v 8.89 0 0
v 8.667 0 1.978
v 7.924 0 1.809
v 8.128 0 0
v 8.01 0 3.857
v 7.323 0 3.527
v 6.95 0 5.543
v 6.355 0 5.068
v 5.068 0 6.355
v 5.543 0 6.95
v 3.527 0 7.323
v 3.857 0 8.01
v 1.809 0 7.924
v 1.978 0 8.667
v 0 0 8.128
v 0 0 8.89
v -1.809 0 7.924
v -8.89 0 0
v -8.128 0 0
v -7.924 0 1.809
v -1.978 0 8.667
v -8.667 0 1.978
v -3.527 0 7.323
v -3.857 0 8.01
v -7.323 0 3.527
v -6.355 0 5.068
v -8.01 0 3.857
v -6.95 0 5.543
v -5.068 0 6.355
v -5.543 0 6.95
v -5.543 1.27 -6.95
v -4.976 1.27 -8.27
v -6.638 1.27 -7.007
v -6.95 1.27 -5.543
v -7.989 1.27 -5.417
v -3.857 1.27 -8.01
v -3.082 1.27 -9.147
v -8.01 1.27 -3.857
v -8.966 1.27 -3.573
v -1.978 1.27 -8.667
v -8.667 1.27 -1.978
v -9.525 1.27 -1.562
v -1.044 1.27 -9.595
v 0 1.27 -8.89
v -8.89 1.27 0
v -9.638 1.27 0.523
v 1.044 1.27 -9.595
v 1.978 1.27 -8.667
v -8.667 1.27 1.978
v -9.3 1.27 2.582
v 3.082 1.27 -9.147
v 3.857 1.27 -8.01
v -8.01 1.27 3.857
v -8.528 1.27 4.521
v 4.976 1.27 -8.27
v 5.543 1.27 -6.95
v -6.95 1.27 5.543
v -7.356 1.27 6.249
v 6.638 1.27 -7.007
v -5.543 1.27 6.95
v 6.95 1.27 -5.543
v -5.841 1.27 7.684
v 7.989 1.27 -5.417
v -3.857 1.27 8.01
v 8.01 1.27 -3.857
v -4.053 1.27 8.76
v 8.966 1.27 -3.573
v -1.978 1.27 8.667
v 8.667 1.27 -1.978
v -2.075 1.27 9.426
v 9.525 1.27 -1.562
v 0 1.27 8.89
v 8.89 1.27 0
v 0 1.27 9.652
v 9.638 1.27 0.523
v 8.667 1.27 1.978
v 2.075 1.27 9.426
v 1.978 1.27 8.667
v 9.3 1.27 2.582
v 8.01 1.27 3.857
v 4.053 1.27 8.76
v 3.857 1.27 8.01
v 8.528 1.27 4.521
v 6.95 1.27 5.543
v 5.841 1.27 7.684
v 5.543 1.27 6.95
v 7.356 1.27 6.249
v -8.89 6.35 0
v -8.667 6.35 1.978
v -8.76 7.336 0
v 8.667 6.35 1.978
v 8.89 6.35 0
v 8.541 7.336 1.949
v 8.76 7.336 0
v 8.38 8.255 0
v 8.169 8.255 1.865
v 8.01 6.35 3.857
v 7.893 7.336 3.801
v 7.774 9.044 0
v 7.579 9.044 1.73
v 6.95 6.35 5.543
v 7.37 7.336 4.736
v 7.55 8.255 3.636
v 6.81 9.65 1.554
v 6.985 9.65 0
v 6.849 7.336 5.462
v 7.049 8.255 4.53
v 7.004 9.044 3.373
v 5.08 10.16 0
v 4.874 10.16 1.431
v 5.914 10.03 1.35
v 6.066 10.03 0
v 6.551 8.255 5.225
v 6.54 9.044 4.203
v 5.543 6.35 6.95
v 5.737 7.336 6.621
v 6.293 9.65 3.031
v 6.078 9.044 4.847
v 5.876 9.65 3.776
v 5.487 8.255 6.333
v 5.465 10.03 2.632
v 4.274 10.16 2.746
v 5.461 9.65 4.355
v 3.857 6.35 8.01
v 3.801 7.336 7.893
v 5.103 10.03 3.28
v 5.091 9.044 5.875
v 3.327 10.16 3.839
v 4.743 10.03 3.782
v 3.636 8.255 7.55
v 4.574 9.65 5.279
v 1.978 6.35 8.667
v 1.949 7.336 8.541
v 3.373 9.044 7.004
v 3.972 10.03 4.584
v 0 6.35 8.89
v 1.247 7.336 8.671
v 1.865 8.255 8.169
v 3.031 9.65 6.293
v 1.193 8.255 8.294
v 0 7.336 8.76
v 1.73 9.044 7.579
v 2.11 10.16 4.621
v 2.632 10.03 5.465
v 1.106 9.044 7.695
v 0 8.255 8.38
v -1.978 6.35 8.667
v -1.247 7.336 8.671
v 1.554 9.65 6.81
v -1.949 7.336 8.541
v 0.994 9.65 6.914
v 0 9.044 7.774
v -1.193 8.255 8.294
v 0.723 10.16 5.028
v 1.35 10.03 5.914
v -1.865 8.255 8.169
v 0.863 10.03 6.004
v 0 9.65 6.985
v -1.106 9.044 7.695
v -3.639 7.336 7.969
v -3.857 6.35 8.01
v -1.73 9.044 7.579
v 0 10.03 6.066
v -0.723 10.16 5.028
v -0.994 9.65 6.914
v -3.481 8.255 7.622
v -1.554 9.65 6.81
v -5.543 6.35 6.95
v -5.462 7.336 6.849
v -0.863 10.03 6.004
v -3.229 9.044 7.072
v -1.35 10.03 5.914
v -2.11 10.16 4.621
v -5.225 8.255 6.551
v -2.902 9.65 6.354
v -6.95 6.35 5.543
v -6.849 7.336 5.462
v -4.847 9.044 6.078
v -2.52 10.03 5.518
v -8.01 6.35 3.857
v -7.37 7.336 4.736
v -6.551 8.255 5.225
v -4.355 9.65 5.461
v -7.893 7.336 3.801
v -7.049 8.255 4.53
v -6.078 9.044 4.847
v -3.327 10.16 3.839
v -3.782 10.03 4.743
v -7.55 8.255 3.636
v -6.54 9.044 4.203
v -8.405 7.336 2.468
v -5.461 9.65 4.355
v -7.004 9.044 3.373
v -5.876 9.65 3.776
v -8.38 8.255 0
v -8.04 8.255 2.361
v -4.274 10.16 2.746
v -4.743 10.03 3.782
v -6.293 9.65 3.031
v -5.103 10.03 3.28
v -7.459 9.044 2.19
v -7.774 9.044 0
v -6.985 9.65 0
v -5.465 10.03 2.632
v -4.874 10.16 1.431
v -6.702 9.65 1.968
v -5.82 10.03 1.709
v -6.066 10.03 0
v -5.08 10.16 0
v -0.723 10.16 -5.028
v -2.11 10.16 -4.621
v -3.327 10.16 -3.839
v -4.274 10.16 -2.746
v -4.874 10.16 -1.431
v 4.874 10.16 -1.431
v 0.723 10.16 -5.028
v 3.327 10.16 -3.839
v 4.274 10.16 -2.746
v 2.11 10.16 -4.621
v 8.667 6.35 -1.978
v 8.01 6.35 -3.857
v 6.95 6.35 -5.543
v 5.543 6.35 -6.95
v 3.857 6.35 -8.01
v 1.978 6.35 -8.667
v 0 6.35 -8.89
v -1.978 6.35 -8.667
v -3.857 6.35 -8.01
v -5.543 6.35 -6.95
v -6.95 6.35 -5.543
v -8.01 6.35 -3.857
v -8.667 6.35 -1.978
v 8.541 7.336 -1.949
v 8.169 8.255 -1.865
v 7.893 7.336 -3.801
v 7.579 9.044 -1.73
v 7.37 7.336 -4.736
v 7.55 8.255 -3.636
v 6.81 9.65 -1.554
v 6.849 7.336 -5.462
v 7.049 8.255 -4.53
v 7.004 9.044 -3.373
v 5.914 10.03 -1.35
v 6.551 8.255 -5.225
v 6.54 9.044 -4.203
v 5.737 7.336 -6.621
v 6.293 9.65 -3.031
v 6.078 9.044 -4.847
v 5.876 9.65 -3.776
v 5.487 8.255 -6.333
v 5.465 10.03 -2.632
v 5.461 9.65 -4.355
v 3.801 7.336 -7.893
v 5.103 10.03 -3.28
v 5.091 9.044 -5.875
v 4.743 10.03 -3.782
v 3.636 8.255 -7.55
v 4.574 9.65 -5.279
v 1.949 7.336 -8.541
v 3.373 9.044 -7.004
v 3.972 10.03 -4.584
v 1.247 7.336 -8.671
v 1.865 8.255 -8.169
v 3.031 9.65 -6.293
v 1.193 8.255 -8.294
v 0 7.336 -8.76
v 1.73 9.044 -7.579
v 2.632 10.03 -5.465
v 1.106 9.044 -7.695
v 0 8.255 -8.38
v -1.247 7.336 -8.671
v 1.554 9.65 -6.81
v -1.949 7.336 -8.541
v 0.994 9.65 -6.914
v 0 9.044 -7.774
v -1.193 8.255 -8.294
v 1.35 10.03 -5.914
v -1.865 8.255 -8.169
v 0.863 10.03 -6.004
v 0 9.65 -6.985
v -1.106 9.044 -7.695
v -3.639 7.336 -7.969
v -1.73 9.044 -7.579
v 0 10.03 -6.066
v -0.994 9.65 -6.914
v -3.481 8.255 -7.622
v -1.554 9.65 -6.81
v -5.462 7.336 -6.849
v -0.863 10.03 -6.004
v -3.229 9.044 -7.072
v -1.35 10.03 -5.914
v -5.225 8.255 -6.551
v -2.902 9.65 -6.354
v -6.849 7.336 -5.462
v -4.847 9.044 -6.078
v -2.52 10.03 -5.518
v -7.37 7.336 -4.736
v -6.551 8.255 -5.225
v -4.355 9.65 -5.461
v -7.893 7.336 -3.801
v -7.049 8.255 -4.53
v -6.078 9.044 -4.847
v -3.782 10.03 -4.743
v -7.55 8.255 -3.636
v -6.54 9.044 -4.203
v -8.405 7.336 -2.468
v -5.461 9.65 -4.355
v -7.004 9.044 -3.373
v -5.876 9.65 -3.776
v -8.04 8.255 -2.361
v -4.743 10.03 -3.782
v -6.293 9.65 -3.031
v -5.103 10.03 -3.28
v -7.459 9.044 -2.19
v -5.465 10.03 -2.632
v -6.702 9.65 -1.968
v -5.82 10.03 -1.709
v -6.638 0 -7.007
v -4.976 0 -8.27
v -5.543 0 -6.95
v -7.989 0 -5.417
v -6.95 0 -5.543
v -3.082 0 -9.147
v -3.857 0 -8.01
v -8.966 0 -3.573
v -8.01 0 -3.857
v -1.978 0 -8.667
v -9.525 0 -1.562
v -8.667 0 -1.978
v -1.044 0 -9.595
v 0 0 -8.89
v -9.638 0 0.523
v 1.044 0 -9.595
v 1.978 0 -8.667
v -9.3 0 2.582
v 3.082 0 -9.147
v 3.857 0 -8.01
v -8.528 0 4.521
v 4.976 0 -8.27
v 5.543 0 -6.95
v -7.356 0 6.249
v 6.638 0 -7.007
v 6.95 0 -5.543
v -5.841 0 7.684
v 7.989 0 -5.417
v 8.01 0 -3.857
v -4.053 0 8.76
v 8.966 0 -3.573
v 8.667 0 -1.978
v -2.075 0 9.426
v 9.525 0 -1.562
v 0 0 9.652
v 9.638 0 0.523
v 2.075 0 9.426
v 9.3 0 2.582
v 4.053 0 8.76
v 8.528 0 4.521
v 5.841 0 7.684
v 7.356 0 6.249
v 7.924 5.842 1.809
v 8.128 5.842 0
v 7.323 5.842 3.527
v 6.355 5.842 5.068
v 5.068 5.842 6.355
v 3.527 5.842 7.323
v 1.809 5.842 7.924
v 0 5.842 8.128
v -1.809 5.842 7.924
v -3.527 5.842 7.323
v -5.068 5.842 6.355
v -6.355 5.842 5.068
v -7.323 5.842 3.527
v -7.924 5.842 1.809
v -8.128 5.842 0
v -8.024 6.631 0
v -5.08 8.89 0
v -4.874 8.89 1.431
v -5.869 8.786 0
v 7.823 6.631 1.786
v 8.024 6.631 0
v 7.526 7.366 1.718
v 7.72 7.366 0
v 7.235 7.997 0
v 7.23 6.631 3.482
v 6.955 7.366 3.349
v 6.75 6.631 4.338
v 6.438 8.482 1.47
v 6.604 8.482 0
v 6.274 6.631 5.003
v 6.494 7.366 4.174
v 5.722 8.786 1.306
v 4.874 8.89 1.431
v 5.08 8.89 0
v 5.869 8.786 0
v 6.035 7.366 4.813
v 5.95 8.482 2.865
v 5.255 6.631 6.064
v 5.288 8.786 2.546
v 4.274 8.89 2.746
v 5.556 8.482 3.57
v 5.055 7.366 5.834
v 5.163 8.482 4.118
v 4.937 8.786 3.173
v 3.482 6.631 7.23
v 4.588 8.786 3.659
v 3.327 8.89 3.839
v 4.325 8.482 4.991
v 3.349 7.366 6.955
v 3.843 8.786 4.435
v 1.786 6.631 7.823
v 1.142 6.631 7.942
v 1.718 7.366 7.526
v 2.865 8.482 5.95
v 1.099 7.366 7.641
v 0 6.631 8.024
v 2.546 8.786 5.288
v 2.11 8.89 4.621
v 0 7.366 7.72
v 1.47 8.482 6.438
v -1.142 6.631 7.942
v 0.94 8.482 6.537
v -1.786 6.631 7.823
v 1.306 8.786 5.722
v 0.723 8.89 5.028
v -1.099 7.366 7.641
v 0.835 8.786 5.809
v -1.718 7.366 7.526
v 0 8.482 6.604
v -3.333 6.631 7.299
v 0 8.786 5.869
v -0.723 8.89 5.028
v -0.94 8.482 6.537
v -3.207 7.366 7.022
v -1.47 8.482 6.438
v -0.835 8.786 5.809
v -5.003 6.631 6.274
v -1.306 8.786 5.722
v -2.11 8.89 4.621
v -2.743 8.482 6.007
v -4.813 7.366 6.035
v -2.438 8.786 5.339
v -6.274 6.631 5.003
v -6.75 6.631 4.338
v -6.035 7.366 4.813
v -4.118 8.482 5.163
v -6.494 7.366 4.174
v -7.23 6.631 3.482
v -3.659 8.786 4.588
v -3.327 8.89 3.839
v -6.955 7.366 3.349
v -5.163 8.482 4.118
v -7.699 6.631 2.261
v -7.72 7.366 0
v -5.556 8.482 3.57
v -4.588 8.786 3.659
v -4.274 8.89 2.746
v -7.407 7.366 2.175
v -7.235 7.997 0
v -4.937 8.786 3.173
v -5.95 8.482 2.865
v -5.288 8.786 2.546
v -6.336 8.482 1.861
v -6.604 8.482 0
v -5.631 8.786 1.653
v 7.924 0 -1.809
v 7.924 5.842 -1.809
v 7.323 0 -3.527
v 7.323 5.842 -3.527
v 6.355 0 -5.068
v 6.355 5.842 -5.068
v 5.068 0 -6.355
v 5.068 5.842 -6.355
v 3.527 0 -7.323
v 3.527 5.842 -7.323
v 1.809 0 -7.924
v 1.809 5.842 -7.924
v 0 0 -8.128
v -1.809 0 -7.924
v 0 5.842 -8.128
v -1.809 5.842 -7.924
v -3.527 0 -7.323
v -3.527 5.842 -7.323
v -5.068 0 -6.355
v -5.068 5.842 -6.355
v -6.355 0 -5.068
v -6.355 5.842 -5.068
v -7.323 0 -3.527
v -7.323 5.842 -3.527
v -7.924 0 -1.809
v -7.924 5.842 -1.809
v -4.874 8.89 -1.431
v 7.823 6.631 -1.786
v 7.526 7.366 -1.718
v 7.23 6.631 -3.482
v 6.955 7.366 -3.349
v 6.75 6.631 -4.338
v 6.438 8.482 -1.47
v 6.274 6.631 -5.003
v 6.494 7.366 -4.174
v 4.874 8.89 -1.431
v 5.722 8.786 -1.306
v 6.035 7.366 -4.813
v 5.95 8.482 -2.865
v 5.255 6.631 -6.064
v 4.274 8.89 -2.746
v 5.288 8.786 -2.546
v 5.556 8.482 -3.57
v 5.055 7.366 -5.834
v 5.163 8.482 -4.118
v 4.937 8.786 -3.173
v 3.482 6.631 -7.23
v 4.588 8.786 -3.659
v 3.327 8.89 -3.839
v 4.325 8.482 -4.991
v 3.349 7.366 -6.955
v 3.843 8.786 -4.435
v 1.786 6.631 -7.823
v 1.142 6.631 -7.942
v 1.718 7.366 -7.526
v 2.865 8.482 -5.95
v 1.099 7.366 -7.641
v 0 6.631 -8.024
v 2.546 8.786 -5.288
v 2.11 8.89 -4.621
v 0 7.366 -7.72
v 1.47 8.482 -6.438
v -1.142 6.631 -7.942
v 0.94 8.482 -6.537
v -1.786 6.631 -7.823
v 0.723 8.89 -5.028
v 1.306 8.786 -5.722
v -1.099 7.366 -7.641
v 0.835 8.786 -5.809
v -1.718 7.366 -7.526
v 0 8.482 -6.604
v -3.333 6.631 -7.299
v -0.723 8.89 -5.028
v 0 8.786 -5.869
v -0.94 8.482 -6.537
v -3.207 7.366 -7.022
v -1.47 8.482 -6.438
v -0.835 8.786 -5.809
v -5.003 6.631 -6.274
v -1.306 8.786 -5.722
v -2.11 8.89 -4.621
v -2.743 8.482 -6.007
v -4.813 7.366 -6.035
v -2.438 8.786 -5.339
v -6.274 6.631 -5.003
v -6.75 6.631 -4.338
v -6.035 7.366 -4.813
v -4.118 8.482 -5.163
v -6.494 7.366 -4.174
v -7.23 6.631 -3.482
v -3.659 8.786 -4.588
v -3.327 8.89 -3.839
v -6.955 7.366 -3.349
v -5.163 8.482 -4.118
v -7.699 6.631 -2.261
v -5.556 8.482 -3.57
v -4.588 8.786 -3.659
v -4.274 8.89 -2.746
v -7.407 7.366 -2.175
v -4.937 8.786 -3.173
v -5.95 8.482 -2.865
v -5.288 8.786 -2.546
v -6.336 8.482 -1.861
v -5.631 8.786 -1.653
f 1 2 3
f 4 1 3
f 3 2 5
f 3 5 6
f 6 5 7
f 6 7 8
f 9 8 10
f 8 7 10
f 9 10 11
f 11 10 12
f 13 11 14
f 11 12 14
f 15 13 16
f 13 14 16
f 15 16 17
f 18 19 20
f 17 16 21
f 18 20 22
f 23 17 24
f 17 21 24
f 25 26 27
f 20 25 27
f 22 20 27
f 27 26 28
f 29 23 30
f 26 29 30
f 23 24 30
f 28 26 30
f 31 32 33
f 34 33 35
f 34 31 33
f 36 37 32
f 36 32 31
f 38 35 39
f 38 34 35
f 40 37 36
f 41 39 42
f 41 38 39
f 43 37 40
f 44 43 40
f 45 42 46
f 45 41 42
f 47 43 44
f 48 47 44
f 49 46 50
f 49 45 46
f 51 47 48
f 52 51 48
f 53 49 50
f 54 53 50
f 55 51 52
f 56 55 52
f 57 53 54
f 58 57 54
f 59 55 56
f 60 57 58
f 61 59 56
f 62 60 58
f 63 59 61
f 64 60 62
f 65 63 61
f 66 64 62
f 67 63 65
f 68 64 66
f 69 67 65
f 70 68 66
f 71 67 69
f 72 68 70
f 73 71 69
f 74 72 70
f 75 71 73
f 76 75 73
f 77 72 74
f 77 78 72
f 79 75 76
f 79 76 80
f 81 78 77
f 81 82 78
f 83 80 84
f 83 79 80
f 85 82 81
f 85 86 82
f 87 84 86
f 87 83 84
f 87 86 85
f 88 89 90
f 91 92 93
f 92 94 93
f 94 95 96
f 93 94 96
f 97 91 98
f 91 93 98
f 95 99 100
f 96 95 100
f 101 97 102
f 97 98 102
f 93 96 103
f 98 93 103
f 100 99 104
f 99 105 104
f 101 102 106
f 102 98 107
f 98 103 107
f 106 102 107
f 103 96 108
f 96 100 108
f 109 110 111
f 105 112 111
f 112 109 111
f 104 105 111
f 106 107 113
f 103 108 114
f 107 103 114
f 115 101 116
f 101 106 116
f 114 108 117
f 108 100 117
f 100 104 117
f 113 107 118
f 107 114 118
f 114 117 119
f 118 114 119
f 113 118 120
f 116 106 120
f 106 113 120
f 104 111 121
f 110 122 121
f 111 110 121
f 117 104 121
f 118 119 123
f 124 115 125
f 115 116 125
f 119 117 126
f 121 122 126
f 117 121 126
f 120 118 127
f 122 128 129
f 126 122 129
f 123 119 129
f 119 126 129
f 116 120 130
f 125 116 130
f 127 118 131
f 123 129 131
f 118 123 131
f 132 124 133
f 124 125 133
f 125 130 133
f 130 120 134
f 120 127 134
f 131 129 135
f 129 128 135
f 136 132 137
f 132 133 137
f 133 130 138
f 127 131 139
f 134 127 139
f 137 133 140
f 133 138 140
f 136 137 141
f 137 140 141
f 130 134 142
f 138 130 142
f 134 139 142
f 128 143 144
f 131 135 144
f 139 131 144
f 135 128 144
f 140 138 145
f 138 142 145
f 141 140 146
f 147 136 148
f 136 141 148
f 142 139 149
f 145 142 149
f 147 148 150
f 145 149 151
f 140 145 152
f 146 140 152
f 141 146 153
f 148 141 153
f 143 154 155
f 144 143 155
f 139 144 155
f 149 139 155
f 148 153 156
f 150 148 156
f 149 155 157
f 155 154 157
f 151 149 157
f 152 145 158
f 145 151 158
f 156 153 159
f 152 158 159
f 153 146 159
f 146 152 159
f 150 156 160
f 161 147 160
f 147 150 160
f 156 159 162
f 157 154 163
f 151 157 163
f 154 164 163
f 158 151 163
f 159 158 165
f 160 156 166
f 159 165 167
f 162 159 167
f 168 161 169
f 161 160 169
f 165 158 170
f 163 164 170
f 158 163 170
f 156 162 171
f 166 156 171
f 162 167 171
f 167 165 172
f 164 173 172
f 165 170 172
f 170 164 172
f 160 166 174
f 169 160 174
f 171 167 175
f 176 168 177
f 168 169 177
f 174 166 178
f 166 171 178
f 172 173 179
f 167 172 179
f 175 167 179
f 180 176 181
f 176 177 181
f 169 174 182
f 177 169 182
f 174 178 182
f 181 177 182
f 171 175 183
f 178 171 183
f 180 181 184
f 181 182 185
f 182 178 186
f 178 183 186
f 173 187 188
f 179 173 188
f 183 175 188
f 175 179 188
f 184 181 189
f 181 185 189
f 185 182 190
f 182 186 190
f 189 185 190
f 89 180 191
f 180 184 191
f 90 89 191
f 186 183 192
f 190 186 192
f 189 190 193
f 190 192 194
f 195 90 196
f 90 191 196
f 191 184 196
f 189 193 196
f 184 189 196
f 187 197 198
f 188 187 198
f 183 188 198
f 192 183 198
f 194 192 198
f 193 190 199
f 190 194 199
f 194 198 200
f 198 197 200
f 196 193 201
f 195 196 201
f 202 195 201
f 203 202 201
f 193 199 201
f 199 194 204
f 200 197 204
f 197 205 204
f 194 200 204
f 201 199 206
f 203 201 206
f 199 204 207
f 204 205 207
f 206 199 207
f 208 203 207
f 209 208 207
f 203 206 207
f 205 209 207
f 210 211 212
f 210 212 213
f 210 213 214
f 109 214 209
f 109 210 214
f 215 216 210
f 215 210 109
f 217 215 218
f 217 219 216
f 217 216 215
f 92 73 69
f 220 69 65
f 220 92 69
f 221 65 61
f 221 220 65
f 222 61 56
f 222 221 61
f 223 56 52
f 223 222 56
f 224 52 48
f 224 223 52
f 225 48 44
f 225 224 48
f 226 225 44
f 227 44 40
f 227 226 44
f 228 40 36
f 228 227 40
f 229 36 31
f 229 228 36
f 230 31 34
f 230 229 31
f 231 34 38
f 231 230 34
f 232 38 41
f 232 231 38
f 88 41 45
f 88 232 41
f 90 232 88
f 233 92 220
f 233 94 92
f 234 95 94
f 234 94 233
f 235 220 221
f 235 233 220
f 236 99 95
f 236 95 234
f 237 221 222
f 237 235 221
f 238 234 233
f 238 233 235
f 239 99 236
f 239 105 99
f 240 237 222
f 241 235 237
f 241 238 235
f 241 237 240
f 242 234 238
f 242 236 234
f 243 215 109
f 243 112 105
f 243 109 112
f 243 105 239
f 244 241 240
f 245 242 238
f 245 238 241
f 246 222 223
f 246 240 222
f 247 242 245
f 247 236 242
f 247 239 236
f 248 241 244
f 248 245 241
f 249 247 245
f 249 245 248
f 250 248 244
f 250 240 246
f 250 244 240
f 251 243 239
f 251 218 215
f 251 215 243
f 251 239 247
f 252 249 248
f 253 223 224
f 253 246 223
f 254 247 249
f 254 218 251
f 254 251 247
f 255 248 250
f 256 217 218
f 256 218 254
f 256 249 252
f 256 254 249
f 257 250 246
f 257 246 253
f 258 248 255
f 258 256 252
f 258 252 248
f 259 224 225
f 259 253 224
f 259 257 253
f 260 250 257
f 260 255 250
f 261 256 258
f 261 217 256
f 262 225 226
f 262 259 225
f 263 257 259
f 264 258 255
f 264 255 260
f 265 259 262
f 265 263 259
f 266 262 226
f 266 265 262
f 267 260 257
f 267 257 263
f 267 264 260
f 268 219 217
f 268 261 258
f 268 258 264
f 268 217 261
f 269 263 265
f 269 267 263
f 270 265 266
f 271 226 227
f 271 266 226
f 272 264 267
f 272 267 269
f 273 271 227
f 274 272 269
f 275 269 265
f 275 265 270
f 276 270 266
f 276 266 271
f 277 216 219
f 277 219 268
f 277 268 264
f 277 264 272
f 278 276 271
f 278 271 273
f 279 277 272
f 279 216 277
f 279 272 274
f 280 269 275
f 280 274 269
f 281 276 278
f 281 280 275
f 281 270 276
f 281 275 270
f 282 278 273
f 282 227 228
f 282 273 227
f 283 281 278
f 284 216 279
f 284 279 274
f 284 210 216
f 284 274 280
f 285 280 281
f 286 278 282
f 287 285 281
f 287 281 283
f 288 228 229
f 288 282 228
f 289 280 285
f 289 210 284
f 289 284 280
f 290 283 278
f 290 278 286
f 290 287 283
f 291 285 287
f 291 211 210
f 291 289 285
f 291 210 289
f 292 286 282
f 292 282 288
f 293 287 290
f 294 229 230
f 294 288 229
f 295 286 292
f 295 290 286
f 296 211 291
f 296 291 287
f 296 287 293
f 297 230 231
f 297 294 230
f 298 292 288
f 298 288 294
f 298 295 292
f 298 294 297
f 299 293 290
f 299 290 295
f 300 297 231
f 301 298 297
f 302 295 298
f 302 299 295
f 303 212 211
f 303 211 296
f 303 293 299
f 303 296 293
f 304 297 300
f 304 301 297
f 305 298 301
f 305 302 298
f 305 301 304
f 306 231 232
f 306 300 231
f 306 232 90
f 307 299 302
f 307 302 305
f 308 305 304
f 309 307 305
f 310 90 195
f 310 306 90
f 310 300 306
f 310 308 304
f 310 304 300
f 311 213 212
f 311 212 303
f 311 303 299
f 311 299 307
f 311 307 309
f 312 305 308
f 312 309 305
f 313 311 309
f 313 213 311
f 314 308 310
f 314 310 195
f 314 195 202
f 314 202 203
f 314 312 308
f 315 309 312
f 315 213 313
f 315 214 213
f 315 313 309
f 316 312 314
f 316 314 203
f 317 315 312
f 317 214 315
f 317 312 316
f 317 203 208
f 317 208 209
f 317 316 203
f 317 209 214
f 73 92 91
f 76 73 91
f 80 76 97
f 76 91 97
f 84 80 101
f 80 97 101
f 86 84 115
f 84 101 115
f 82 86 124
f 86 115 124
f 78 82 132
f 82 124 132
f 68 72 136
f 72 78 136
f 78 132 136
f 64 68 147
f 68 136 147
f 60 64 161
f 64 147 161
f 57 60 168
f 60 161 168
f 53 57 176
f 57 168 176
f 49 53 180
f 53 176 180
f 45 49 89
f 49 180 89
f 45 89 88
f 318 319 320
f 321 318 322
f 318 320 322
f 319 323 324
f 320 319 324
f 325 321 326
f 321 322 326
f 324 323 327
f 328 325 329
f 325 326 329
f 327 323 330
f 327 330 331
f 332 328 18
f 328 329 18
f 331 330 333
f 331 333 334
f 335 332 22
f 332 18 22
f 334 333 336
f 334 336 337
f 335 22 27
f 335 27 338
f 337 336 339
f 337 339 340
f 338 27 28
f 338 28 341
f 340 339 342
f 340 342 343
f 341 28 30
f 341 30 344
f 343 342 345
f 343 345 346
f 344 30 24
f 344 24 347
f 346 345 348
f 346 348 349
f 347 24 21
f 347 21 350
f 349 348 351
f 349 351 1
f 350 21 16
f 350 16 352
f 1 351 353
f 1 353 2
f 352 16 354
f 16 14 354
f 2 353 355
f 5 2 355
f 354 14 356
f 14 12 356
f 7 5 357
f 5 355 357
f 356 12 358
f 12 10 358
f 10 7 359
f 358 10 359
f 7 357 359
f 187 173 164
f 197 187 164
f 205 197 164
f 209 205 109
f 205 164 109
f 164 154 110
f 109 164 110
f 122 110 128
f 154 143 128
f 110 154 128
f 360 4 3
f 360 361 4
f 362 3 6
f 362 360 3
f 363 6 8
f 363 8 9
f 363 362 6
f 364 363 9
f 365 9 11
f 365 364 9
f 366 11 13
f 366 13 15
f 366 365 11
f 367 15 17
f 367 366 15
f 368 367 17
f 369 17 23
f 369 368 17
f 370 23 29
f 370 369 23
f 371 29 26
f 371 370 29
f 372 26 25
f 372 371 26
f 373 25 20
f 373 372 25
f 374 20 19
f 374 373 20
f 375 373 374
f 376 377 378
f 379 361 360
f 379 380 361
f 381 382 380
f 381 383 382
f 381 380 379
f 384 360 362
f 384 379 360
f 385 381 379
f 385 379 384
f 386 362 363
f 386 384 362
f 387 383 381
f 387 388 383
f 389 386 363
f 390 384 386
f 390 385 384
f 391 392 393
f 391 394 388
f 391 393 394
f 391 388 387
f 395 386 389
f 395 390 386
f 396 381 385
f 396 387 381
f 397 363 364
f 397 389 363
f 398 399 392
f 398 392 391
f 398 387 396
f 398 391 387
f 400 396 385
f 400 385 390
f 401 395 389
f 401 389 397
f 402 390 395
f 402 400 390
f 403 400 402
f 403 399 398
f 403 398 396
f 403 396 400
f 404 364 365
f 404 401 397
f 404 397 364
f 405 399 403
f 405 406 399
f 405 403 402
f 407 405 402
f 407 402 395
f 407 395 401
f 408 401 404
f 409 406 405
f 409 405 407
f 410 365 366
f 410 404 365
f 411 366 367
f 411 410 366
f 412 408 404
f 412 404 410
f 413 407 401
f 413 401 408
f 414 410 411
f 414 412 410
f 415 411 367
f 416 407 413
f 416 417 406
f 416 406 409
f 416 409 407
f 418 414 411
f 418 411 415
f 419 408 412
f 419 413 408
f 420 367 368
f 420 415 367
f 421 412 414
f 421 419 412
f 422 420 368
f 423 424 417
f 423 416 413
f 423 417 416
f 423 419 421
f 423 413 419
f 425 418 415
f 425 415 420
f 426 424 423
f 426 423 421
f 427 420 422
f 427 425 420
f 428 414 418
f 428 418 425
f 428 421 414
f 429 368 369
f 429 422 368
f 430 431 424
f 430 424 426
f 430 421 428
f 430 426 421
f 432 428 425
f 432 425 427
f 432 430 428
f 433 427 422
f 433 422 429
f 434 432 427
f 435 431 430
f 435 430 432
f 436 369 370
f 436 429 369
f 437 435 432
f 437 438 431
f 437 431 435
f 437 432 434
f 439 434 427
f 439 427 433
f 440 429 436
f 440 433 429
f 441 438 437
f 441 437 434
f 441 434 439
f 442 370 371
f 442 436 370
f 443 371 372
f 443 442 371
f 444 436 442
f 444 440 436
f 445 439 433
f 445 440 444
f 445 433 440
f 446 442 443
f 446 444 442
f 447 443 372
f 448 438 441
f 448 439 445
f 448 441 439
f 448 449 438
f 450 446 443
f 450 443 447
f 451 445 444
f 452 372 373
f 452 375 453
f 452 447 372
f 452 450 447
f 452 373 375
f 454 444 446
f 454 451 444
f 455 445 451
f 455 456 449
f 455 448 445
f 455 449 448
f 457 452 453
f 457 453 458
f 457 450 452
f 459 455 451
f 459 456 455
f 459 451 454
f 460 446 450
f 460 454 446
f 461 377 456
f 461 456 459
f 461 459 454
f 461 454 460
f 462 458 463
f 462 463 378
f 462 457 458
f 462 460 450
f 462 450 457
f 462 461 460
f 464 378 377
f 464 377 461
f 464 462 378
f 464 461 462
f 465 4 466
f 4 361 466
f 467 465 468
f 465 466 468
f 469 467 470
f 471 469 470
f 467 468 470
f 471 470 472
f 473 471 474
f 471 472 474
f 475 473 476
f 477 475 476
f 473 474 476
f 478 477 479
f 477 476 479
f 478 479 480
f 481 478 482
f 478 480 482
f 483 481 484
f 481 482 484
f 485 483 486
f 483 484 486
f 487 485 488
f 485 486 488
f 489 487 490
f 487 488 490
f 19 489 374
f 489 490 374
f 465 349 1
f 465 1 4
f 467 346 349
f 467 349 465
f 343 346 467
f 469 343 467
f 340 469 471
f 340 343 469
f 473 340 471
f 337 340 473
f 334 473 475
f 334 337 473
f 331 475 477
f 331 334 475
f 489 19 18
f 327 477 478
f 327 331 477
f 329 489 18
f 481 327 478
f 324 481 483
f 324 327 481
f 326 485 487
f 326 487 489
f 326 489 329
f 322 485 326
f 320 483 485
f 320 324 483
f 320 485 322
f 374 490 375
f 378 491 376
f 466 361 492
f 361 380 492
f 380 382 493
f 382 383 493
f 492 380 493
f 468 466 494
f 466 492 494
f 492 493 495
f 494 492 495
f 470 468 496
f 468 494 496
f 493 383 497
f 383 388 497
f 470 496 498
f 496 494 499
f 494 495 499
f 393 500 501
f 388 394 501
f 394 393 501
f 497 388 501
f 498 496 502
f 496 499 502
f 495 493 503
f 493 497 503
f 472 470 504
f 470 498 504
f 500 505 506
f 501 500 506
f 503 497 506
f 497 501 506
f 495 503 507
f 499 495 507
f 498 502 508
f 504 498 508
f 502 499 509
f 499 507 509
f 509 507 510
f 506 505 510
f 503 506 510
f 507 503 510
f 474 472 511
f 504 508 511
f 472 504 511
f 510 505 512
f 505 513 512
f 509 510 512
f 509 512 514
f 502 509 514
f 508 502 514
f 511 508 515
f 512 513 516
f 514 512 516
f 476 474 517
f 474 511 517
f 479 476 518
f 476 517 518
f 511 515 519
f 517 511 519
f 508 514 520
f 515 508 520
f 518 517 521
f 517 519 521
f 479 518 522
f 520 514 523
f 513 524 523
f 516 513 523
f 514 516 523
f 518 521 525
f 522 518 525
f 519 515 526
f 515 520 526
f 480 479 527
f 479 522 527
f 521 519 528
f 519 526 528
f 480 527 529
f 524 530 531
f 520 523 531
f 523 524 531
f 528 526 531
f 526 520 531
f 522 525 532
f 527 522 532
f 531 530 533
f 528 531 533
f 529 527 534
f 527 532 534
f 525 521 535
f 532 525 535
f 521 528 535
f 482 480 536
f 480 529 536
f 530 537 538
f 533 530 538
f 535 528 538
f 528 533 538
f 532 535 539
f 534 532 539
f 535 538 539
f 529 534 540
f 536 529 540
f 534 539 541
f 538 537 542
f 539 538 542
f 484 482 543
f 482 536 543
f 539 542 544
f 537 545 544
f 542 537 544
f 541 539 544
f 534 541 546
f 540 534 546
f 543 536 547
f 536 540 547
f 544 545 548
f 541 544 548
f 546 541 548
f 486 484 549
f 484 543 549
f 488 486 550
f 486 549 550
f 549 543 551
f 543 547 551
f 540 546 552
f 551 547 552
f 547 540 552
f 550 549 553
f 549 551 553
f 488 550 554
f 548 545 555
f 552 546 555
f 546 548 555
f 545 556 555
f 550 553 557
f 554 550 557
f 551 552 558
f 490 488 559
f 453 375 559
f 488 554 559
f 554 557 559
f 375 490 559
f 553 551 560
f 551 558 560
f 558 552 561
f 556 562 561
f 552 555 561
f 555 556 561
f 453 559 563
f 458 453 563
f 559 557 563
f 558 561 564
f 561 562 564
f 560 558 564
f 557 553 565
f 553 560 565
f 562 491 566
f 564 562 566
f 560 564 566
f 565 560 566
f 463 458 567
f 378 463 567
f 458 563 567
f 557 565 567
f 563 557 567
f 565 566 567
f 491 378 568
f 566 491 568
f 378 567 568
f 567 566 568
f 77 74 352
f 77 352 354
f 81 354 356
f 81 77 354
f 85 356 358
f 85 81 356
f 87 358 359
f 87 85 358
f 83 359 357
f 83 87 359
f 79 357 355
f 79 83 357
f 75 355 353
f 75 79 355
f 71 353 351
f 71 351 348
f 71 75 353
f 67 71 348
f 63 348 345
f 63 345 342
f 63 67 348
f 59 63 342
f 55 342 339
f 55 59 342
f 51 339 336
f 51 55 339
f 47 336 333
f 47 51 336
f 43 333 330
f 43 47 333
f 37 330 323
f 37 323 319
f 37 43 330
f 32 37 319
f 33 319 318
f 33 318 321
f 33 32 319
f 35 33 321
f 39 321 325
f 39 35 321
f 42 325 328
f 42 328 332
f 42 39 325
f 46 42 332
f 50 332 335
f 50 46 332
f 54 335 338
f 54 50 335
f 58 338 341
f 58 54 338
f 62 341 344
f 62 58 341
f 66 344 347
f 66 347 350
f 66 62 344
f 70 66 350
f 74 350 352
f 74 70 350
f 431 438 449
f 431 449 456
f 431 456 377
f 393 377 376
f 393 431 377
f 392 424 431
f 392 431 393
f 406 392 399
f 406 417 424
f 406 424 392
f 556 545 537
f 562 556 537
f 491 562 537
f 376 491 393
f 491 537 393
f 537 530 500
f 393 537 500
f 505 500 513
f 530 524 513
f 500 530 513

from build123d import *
from build123d.topology import SkipClean

# Parameters (mm, degrees)
BODY_ANGLE   = 180
INSIDE_ANGLE = 180
LIP_START    = 1.27
SKETCH4_R    = 9.652
SKETCH4_R_2  = 8.89
LIP_DEPTH    = 1.27


with BuildPart() as part:
    # Sketch1 → Body (revolve)
    with BuildSketch(Plane.XY):
        with BuildLine():
            Line((0, 0), (8.89, 0))
            Line((8.89, 0), (8.89, 6.35))
            ThreePointArc((8.89, 6.35), (7.774076836, 9.044076836), (5.08, 10.16))
            Line((5.08, 10.16), (0, 10.16))
            Line((0, 10.16), (0, 0))
        make_face()
    revolve(axis=Axis((0, 0, 0), (0, 1, 0)), revolution_arc=BODY_ANGLE)

    # Sketch2 → Inside (revolve, cut)
    with BuildSketch(Plane.XY):
        with BuildLine():
            Line((0, 0), (8.128, 0))
            Line((8.128, 0), (8.128, 5.842))
            ThreePointArc((8.128, 5.842), (7.235261469, 7.997261469), (5.08, 8.89))
            Line((5.08, 8.89), (0, 8.89))
            Line((0, 8.89), (0, 0))
        make_face()
    revolve(axis=Axis((0, 0, 0), (0, 1, 0)), revolution_arc=INSIDE_ANGLE, mode=Mode.SUBTRACT)

    # Mirror 2: part across face


with BuildPart() as part_1:
    with SkipClean():  # the faces are left unmerged after this step: merging them gives an invalid solid
        add(part.part)
        add(part.part.mirror(Plane(origin=(0, 7.378791693, 0), x_dir=(1, 0, 0), z_dir=(0, 0, 1))))

    # Sketch4 → Lip (add)
    with SkipClean():  # the faces are left unmerged after this step: merging them gives an invalid solid
        with BuildSketch(Plane(origin=(0, 0, 0), x_dir=(1, 0, 0), z_dir=(0, 1, 0)).offset(LIP_START)):
            with Locations(Location((0, 0, 0), (0, 0, 270))):
                Circle(SKETCH4_R)
            with Locations(Location((0, 0, 0), (0, 0, 90))):
                Circle(SKETCH4_R_2, mode=Mode.SUBTRACT)
        extrude(amount=-LIP_DEPTH)


solid = part_1.part
